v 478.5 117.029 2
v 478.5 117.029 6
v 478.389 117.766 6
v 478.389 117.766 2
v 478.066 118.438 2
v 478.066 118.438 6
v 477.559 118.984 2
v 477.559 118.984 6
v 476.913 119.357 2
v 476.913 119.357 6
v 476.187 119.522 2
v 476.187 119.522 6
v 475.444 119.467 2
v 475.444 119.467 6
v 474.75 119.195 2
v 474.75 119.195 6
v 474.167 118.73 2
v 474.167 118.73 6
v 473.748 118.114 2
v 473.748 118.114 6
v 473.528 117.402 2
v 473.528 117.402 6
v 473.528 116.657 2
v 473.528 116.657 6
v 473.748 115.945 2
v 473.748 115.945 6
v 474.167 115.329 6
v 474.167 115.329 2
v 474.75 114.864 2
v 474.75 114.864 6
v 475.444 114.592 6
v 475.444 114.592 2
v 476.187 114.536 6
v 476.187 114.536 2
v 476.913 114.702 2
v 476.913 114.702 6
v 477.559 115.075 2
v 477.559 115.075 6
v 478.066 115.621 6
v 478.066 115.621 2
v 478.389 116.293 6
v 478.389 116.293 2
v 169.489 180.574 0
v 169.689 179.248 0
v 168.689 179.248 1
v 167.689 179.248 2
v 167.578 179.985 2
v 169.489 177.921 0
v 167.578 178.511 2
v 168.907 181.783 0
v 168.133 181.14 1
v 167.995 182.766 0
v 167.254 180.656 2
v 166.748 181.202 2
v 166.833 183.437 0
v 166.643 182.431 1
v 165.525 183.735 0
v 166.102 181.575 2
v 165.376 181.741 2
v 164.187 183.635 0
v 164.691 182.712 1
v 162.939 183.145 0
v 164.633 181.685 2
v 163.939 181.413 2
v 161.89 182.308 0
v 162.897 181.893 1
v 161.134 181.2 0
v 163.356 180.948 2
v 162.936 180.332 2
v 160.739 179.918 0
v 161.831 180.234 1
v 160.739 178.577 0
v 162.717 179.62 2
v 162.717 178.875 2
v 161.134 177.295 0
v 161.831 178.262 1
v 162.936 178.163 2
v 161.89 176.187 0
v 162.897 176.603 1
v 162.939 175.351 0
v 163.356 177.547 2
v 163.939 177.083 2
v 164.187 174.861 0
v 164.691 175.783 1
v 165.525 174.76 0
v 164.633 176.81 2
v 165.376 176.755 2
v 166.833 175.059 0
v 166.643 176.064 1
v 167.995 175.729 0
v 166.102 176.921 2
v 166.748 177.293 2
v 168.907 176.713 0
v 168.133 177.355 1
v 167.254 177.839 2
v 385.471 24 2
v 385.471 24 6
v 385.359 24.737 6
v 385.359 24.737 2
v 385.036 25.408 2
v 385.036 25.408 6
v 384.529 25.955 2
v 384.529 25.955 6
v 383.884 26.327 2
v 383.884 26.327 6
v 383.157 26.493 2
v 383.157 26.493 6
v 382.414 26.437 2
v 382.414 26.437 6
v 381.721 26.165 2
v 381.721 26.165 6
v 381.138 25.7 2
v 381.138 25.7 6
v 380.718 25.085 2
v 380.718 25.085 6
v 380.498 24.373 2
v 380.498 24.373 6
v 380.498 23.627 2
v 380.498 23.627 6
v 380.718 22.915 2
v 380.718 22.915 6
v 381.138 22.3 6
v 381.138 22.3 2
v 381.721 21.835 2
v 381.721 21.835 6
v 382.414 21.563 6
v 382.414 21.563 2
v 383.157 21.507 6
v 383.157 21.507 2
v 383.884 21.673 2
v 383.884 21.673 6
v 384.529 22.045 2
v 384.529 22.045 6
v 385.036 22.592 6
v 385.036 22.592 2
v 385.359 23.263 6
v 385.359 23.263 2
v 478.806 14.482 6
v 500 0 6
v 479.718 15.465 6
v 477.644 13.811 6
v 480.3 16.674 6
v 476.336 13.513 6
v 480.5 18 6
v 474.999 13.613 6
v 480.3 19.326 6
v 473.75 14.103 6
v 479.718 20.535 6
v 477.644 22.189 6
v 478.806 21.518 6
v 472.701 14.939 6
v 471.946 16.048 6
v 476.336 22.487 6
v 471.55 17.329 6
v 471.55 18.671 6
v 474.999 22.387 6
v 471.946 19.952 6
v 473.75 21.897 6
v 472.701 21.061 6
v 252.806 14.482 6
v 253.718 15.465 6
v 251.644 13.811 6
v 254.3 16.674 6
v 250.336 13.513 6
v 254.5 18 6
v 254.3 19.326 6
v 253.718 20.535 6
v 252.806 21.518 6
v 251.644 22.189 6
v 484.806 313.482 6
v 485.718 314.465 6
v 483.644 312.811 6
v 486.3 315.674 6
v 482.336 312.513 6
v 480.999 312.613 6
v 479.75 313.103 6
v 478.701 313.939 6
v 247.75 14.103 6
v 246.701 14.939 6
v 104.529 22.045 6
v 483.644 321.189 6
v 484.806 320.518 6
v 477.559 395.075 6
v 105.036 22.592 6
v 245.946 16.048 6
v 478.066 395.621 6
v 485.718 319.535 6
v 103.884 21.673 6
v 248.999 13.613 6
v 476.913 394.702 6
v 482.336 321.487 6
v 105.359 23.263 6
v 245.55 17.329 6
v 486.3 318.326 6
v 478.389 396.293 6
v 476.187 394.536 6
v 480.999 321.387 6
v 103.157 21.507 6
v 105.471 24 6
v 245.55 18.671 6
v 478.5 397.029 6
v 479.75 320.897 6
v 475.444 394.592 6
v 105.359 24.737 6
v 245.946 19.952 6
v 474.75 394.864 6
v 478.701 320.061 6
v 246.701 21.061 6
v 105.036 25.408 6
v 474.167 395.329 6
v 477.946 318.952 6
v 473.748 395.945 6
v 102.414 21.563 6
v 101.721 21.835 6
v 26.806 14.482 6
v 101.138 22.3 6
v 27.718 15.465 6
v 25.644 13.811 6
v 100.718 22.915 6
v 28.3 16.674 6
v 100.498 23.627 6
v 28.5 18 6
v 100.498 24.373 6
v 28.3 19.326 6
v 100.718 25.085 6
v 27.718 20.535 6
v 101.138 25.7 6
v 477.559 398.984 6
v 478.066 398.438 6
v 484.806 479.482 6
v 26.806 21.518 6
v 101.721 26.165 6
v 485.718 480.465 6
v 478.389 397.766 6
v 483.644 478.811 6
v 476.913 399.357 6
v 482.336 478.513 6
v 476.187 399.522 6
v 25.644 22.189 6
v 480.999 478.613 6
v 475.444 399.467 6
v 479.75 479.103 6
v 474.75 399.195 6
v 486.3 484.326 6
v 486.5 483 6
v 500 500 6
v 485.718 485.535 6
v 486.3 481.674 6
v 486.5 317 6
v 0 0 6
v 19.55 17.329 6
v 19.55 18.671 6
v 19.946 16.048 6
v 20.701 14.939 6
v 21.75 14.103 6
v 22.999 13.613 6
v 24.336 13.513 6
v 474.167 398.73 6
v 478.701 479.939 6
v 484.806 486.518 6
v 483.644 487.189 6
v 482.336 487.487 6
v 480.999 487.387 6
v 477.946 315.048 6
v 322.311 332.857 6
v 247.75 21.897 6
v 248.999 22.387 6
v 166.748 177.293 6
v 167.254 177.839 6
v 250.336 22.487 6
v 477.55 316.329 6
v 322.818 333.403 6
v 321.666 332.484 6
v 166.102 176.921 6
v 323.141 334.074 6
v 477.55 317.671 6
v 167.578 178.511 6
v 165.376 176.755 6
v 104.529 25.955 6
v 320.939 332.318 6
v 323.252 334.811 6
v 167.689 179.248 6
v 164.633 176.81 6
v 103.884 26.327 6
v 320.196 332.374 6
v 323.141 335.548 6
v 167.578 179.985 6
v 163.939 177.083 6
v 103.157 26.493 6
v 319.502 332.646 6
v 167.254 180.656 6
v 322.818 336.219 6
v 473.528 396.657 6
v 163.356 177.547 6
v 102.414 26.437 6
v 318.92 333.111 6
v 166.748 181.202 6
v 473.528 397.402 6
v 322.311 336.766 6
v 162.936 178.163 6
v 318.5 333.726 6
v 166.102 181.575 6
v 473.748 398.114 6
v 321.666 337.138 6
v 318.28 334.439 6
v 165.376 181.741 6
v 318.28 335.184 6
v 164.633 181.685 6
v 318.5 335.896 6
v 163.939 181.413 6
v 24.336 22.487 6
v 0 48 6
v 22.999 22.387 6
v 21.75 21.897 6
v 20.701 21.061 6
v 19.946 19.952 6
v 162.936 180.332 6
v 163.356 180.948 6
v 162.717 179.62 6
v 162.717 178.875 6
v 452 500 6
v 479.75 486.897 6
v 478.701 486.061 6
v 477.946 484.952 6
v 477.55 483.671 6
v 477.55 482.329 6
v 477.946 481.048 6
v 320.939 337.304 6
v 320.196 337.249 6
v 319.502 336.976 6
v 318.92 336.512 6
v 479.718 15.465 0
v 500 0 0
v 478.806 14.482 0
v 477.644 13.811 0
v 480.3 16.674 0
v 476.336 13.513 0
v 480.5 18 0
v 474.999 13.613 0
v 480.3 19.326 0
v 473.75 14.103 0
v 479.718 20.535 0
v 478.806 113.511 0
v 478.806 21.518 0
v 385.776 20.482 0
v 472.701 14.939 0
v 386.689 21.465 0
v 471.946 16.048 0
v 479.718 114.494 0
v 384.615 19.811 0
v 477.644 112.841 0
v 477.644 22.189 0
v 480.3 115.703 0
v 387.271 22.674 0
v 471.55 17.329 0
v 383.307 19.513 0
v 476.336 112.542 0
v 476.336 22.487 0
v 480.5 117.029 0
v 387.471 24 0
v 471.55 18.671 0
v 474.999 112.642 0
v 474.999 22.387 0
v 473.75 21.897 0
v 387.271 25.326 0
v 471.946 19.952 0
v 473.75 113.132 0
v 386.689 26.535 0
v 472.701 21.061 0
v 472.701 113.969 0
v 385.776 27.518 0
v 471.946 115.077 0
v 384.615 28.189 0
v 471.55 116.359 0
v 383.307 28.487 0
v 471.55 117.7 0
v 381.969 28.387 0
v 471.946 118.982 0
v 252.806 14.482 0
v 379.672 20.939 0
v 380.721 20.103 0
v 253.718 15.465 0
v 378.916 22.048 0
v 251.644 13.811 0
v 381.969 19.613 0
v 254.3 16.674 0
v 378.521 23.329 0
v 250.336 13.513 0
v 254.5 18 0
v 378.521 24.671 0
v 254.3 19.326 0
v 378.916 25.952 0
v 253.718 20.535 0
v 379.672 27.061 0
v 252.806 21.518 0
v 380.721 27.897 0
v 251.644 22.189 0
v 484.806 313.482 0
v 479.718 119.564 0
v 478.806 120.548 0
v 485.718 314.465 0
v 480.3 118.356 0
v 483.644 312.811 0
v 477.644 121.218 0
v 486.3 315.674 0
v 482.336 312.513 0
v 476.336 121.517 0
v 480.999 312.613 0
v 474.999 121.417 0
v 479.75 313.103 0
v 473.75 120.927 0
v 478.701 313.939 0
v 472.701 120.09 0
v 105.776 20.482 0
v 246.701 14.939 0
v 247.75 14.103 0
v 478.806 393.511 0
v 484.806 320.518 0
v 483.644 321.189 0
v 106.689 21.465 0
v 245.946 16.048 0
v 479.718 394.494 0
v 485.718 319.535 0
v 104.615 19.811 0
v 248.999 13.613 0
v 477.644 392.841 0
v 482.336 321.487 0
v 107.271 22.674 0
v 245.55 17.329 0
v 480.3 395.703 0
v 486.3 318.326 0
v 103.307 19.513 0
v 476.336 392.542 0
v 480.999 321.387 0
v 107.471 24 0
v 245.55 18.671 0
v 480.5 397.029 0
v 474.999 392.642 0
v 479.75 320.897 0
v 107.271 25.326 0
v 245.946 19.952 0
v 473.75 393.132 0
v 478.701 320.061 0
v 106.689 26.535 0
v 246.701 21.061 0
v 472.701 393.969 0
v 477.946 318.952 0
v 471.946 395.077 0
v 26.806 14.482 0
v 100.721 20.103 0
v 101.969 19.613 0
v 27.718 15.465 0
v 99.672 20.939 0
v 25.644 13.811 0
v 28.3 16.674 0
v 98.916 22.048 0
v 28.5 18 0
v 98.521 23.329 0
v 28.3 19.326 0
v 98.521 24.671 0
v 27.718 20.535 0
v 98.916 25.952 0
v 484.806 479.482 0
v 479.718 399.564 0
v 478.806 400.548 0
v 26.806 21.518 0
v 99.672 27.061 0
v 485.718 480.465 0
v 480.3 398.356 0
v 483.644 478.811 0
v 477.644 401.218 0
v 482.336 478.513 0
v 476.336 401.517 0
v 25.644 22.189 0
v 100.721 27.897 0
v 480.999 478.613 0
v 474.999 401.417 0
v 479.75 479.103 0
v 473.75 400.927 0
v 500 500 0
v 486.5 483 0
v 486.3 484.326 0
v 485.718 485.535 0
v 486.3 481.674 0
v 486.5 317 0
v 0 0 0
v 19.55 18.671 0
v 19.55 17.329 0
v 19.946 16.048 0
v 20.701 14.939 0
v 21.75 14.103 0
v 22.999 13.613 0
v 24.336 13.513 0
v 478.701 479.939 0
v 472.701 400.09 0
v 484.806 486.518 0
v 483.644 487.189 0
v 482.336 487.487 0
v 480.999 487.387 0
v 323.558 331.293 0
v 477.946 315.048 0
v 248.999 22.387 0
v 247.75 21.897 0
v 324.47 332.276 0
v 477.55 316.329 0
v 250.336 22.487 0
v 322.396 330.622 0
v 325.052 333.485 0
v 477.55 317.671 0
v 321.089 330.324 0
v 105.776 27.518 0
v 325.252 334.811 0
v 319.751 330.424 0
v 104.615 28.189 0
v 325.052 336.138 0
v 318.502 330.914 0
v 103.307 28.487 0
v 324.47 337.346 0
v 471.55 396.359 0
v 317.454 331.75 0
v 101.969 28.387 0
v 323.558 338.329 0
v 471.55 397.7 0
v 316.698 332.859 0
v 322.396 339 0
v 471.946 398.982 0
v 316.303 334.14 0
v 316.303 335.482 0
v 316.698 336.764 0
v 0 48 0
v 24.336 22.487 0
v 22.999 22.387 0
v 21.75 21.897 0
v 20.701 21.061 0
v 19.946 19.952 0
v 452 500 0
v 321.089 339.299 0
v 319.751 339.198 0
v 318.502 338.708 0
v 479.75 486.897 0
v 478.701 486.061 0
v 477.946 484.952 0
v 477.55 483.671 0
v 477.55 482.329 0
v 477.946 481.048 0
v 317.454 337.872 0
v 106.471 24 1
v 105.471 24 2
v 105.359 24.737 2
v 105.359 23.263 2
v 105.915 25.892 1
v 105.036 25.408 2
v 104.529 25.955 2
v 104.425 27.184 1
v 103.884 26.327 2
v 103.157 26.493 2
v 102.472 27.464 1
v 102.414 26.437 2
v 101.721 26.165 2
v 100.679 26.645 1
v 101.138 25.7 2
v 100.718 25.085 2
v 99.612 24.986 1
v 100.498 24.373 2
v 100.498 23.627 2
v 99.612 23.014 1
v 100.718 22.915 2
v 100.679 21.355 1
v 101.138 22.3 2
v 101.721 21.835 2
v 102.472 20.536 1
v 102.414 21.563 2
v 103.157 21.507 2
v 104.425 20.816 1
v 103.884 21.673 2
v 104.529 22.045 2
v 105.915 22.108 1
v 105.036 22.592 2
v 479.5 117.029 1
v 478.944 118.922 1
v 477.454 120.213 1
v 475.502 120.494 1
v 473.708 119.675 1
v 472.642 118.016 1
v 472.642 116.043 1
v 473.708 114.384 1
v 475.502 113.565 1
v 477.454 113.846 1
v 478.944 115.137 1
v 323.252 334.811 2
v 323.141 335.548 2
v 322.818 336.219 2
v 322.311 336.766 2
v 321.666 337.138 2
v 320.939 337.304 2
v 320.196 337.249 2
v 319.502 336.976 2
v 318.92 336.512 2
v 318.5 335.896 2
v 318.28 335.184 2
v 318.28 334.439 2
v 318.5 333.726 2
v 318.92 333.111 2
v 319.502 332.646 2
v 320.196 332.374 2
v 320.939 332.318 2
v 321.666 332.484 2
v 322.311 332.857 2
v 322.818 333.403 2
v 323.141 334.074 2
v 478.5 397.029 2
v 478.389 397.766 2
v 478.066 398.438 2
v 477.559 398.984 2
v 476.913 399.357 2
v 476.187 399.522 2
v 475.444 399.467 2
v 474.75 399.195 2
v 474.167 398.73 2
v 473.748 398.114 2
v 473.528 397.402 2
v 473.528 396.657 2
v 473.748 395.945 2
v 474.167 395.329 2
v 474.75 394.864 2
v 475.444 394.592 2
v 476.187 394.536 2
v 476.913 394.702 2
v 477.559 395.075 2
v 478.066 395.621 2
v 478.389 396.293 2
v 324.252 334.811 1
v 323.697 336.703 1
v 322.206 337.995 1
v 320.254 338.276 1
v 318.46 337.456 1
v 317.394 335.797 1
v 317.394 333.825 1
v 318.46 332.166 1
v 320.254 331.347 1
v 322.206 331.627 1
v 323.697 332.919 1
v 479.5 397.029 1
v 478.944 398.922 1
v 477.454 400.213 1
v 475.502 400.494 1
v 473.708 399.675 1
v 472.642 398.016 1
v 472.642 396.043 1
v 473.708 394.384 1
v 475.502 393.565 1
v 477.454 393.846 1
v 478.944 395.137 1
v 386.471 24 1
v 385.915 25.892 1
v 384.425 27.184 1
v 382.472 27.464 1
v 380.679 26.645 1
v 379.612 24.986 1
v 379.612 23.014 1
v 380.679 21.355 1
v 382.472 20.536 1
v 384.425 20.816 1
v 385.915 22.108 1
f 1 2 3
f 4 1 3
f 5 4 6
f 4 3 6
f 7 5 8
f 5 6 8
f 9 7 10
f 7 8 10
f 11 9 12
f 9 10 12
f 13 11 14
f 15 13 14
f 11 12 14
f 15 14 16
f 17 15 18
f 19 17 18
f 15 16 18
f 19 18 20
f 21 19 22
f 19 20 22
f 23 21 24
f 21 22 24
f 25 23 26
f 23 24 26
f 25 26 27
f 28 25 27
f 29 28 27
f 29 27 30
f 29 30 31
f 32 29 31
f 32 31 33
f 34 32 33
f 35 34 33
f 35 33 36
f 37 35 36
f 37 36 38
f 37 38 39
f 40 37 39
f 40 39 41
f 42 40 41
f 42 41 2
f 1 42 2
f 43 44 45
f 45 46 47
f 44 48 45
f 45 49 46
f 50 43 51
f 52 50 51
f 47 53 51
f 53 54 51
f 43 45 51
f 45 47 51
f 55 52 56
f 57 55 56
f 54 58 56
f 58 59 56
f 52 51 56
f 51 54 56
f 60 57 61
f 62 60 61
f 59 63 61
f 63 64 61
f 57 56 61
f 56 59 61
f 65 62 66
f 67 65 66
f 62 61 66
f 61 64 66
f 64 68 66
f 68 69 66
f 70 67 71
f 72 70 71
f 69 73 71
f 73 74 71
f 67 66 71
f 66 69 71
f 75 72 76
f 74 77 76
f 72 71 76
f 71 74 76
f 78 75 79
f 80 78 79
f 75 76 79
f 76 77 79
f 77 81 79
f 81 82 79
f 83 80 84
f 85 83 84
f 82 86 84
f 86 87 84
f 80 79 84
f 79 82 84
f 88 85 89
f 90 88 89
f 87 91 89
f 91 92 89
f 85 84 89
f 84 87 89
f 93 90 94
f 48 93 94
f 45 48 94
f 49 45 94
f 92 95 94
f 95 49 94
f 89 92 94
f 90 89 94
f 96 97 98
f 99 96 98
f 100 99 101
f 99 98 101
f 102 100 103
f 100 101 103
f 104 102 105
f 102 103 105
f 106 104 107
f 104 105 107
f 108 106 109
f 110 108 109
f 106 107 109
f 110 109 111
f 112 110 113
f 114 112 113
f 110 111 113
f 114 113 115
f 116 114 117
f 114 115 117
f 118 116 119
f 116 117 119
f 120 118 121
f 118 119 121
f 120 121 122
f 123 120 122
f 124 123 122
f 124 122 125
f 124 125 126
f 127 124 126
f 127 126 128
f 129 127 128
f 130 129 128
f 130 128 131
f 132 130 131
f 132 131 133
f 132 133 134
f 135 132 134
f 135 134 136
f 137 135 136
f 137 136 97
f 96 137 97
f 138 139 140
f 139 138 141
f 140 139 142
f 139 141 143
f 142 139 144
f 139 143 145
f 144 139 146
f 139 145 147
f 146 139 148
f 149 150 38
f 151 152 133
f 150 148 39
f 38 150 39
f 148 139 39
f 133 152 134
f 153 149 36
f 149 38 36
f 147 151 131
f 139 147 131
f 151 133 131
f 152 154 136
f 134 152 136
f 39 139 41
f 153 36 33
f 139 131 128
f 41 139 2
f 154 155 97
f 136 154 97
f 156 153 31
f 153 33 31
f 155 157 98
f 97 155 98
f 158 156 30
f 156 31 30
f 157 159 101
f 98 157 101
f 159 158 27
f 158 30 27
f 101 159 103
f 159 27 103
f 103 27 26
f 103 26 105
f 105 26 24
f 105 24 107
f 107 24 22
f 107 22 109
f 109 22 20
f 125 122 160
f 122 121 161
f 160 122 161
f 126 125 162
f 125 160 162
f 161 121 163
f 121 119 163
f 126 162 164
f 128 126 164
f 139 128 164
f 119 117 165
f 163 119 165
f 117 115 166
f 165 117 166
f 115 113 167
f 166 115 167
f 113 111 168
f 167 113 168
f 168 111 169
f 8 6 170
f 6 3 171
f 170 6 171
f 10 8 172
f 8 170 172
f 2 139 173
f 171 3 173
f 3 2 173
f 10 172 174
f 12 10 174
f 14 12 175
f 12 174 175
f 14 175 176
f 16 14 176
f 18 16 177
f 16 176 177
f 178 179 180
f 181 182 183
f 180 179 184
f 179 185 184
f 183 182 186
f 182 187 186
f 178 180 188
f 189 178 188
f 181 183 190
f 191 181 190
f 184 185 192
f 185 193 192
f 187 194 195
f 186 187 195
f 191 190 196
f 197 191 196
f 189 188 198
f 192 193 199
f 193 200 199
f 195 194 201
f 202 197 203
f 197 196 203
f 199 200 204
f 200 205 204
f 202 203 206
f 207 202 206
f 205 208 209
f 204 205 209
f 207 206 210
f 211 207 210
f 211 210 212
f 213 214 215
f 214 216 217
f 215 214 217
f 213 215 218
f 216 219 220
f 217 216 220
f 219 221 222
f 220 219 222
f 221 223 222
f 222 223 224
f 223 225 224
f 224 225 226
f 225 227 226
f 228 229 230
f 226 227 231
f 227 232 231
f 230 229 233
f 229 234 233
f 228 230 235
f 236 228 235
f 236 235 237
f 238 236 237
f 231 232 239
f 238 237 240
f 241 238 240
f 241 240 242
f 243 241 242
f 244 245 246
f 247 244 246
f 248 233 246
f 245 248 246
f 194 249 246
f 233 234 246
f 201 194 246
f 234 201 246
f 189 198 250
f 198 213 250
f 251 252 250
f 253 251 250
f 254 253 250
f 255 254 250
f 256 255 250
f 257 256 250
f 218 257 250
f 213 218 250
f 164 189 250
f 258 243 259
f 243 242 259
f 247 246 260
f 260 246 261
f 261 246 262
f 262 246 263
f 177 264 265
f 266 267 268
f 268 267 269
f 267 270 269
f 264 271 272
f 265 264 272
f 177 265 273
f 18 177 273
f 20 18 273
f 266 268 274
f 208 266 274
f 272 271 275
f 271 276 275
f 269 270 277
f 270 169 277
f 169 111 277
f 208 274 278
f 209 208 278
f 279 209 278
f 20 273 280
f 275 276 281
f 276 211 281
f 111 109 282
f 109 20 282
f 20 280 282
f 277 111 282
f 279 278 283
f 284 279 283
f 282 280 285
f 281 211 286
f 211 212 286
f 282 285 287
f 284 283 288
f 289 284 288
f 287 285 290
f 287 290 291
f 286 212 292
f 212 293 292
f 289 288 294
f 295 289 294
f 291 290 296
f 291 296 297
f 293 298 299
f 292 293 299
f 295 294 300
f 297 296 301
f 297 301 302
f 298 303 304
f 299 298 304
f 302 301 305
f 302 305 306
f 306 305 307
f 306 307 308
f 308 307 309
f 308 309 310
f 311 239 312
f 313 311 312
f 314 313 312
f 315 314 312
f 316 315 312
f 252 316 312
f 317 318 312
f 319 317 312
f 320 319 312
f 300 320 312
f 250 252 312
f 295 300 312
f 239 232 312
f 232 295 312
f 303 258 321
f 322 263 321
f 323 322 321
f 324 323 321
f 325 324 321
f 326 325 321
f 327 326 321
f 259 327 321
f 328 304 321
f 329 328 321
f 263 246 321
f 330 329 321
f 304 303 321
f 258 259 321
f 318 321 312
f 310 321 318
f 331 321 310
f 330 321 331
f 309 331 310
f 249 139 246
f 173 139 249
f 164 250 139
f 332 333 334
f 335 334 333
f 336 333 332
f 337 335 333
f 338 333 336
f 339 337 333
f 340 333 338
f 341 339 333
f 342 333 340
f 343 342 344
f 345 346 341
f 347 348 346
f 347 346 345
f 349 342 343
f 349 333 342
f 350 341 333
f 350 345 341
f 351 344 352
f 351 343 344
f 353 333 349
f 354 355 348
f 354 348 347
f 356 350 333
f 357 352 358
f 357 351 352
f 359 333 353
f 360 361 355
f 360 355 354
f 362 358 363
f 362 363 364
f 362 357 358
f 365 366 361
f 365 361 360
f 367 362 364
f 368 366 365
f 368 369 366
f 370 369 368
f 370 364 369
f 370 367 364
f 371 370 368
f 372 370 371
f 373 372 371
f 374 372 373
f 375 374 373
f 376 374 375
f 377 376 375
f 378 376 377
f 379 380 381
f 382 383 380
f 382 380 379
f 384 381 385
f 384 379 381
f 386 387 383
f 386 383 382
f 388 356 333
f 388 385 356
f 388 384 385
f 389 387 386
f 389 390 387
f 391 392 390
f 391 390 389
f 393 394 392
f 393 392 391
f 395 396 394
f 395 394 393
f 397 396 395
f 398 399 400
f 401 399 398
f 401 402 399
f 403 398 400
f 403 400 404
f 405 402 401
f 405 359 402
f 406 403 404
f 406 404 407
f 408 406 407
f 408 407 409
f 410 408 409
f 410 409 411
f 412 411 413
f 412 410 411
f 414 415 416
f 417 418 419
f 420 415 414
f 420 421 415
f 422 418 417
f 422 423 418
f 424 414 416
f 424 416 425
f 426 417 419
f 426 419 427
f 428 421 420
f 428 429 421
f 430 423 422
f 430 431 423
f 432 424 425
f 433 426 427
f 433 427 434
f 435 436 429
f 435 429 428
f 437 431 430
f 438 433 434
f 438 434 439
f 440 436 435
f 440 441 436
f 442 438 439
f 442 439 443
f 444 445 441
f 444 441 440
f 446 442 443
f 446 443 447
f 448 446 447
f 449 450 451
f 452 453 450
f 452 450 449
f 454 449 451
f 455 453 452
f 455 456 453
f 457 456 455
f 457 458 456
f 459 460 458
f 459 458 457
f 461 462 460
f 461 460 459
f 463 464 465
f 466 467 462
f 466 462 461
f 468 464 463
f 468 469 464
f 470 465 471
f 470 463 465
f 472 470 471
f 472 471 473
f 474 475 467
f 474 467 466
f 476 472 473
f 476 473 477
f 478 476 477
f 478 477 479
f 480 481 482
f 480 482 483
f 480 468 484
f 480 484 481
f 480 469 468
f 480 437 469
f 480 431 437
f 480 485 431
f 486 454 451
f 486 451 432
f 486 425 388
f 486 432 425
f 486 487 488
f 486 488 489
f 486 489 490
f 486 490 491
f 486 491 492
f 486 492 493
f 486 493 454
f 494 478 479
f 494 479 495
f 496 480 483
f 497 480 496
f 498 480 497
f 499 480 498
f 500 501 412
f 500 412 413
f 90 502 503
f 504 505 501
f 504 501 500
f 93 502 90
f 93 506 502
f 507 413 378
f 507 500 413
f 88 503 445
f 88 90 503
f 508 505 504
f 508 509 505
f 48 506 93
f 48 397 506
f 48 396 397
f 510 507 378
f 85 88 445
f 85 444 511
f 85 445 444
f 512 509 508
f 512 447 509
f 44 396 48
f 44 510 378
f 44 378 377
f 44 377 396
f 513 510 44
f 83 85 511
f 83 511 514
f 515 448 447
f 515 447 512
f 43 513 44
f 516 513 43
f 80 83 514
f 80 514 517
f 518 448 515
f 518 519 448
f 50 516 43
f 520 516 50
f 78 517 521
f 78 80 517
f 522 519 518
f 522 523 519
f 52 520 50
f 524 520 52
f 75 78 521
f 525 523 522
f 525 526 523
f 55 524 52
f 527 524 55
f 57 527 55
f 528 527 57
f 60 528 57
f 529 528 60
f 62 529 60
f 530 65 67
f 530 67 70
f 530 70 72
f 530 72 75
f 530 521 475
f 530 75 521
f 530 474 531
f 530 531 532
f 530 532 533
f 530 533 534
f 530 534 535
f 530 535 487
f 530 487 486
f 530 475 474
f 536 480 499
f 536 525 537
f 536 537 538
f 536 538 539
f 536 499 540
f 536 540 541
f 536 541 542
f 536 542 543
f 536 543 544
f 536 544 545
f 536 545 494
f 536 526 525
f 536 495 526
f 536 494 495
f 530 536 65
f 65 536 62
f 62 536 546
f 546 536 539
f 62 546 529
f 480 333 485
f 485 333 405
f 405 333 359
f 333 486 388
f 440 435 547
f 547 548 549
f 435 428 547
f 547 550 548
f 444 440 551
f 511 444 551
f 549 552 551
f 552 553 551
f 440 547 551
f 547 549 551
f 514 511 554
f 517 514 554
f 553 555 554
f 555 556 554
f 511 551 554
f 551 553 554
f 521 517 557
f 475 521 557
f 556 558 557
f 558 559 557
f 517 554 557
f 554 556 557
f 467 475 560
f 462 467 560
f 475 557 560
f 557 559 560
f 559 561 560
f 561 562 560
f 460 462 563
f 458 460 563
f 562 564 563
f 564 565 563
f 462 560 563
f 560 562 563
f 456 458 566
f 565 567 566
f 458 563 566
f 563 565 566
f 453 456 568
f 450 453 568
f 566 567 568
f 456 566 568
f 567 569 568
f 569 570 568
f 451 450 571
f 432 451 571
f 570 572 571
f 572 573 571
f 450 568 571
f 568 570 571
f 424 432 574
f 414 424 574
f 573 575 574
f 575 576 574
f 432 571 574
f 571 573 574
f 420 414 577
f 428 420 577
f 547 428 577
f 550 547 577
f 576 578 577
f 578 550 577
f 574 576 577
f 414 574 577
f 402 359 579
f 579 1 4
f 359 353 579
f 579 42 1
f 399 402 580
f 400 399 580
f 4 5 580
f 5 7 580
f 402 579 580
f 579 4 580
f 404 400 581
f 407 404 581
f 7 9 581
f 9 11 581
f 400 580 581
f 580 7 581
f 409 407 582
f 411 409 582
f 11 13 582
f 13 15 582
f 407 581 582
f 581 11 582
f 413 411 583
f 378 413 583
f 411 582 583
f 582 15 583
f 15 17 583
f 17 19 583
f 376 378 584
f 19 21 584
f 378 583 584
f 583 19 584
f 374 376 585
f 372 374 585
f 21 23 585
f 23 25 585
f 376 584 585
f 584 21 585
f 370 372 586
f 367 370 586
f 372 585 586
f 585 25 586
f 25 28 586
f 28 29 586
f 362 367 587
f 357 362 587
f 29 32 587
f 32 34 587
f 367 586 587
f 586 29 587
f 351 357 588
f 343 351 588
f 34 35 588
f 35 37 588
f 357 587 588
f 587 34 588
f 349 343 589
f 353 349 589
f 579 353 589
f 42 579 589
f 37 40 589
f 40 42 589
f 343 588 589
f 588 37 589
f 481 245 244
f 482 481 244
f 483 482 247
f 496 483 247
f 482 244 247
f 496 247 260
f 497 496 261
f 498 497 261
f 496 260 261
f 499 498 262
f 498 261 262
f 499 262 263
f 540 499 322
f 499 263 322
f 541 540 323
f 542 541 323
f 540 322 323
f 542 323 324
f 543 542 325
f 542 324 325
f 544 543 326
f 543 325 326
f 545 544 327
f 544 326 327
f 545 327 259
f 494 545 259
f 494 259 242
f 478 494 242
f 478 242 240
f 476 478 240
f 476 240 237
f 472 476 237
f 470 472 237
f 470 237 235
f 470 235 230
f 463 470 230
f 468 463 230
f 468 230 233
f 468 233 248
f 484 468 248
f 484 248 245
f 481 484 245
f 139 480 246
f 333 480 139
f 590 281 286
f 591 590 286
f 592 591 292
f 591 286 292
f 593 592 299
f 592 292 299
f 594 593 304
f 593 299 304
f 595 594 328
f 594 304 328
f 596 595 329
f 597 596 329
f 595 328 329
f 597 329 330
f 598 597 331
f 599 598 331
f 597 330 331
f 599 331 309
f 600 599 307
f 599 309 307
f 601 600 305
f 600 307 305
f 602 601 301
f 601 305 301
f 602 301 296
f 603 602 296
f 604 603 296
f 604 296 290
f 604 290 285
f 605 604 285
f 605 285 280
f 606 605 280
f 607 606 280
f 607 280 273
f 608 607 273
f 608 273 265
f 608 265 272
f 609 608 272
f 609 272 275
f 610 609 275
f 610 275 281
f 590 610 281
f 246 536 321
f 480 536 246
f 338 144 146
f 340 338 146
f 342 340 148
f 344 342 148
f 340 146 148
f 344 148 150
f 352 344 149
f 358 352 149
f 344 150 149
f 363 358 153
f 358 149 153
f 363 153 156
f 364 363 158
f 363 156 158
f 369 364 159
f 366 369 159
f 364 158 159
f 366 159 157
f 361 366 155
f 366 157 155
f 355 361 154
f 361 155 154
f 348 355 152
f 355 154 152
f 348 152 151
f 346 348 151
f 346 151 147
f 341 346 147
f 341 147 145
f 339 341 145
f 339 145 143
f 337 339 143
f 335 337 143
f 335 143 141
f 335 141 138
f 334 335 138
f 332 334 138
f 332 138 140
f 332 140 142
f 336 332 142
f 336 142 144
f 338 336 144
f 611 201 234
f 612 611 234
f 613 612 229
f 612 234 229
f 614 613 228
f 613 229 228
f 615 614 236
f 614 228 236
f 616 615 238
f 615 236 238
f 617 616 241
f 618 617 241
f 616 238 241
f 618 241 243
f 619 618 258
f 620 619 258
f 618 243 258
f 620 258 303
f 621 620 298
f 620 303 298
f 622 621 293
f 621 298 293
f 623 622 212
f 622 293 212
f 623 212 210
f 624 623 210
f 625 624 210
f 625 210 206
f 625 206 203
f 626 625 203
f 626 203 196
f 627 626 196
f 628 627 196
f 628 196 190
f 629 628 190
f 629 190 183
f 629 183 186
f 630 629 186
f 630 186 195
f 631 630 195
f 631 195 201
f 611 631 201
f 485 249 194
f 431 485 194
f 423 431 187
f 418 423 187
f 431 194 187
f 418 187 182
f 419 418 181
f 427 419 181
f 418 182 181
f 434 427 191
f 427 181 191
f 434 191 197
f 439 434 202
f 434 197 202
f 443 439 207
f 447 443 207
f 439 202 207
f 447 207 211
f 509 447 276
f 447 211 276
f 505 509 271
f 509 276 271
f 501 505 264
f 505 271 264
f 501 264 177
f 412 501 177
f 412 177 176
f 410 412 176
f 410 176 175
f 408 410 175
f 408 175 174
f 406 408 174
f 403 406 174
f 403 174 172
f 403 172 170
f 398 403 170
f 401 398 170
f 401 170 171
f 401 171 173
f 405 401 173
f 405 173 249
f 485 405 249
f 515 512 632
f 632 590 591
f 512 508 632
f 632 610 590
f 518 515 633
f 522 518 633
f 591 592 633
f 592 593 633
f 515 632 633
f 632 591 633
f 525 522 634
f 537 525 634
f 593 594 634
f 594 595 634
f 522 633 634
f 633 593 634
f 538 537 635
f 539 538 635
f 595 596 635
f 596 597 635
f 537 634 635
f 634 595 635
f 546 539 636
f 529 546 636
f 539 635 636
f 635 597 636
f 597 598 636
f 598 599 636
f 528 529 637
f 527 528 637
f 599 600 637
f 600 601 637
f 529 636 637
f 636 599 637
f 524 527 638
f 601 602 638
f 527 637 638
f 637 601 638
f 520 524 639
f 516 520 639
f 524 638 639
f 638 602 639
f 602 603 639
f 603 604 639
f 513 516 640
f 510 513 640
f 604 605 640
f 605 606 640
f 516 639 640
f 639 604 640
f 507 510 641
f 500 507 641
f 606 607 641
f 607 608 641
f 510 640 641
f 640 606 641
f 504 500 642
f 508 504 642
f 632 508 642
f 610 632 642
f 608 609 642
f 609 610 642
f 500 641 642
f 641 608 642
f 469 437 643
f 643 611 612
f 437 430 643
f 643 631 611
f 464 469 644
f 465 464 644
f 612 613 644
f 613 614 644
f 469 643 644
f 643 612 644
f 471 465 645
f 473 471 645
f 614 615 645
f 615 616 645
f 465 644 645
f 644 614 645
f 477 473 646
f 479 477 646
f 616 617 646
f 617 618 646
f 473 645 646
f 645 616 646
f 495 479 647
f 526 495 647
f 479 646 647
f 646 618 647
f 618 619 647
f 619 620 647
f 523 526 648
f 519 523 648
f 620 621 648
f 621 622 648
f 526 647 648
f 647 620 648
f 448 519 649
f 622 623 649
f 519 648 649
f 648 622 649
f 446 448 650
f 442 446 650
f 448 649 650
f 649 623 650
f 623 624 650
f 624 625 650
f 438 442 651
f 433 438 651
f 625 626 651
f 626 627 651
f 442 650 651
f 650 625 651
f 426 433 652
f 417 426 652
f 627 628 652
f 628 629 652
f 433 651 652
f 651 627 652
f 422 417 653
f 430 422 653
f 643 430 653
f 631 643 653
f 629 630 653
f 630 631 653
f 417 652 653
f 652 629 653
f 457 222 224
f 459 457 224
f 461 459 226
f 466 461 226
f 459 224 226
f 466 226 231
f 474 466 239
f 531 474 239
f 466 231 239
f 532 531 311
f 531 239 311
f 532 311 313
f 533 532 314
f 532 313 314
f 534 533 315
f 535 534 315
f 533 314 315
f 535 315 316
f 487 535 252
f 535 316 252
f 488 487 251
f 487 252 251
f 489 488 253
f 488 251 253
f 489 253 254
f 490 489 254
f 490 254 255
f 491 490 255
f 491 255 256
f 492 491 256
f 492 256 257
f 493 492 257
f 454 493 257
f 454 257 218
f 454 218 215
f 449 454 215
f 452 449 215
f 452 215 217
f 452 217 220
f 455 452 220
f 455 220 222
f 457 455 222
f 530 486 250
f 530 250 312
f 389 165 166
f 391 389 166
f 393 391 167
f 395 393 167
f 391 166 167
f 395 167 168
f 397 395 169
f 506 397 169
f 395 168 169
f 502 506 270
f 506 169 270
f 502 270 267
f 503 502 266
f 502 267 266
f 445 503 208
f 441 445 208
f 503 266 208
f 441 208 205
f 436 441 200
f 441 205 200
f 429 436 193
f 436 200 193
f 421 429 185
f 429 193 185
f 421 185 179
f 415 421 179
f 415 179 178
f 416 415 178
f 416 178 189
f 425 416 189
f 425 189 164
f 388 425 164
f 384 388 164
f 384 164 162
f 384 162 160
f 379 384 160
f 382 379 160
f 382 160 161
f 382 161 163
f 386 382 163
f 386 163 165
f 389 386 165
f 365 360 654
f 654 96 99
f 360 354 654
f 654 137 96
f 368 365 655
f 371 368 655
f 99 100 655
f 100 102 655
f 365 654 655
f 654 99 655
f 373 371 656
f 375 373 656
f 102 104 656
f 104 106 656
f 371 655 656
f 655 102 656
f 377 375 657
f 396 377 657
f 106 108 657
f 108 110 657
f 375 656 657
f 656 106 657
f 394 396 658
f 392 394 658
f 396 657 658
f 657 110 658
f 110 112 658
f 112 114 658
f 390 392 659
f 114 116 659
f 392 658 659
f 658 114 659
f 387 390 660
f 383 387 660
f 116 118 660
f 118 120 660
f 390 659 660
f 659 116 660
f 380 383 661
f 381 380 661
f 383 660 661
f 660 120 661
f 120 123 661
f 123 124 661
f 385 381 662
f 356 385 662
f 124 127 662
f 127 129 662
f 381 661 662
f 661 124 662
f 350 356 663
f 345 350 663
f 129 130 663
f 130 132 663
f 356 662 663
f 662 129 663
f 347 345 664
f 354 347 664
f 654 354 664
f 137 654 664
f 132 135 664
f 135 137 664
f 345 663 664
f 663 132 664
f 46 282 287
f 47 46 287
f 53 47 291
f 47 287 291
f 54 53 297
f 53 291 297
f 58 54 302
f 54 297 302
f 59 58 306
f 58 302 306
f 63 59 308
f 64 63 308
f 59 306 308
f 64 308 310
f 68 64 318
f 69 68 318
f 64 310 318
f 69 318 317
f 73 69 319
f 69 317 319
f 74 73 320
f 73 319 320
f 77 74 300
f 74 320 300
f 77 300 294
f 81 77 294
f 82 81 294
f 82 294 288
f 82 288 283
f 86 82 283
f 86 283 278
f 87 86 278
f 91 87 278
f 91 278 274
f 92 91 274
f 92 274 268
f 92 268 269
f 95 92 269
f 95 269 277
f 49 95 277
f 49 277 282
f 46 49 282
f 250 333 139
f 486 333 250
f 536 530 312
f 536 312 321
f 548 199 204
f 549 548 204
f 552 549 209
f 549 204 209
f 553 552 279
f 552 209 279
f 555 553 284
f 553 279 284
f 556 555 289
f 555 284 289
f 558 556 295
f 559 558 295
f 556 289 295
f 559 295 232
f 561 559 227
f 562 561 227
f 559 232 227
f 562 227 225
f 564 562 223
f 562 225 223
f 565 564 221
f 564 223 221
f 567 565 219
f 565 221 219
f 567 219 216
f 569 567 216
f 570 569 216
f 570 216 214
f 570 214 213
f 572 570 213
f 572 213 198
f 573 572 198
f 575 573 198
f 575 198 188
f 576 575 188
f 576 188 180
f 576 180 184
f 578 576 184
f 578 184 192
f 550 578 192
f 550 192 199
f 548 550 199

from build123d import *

# Parameters (mm, degrees)
BOSS_EXTRU_1_DEPTH      = 6
ESQUISSE2_R             = 4.5
ENL_V_MAT_EXTRU_1_DEPTH = 708.132236572
ESQUISSE5_R             = 2.5
ENL_V_MAT_EXTRU_3_DEPTH = 708.132236572
CHANFREIN2_SIZE         = 2


with BuildPart() as part:
    # Esquisse1 → Boss.-Extru.1 (new body)
    with BuildSketch(Plane.XY):
        Polygon((0, 0), (0, 48), (452, 500), (500, 500), (500, 0), align=None)
    extrude(amount=BOSS_EXTRU_1_DEPTH)

    # Esquisse2 → Enlèv. mat.-Extru.1 (cut, through all)
    with BuildSketch(Plane.XY.offset(6)):
        with Locations((24, 18)):
            Circle(ESQUISSE2_R)
        with Locations((250, 18)):
            Circle(ESQUISSE2_R)
        with Locations((476, 18)):
            Circle(ESQUISSE2_R)
        with Locations((482, 483)):
            Circle(ESQUISSE2_R)
        with Locations((482, 317)):
            Circle(ESQUISSE2_R)
    extrude(amount=-ENL_V_MAT_EXTRU_1_DEPTH, mode=Mode.SUBTRACT)

    # Esquisse5 → Enlèv. mat.-Extru.3 (cut, through all)
    with BuildSketch(Plane.XY.offset(6)):
        with Locations((165.188816818, 179.247691321)):
            Circle(ESQUISSE5_R)
        with Locations((320.752308679, 334.811183182)):
            Circle(ESQUISSE5_R)
        with Locations((102.970562748, 24)):
            Circle(ESQUISSE5_R)
        with Locations((382.970562748, 24)):
            Circle(ESQUISSE5_R)
        with Locations((476, 397.029437252)):
            Circle(ESQUISSE5_R)
        with Locations((476, 117.029437252)):
            Circle(ESQUISSE5_R)
    extrude(amount=-ENL_V_MAT_EXTRU_3_DEPTH, mode=Mode.SUBTRACT)

    # Chanfrein2
    chanfrein2_edges = [part.edges().sort_by_distance(p)[0] for p in [
        (318.252308679, 334.811183182, 0),
        (100.470562748, 24, 0),
        (380.470562748, 24, 0),
        (473.5, 397.029437252, 0),
        (473.5, 117.029437252, 0),
        (162.688816818, 179.247691321, 0),
    ]]
    chamfer(chanfrein2_edges, length=CHANFREIN2_SIZE)


solid = part.part
